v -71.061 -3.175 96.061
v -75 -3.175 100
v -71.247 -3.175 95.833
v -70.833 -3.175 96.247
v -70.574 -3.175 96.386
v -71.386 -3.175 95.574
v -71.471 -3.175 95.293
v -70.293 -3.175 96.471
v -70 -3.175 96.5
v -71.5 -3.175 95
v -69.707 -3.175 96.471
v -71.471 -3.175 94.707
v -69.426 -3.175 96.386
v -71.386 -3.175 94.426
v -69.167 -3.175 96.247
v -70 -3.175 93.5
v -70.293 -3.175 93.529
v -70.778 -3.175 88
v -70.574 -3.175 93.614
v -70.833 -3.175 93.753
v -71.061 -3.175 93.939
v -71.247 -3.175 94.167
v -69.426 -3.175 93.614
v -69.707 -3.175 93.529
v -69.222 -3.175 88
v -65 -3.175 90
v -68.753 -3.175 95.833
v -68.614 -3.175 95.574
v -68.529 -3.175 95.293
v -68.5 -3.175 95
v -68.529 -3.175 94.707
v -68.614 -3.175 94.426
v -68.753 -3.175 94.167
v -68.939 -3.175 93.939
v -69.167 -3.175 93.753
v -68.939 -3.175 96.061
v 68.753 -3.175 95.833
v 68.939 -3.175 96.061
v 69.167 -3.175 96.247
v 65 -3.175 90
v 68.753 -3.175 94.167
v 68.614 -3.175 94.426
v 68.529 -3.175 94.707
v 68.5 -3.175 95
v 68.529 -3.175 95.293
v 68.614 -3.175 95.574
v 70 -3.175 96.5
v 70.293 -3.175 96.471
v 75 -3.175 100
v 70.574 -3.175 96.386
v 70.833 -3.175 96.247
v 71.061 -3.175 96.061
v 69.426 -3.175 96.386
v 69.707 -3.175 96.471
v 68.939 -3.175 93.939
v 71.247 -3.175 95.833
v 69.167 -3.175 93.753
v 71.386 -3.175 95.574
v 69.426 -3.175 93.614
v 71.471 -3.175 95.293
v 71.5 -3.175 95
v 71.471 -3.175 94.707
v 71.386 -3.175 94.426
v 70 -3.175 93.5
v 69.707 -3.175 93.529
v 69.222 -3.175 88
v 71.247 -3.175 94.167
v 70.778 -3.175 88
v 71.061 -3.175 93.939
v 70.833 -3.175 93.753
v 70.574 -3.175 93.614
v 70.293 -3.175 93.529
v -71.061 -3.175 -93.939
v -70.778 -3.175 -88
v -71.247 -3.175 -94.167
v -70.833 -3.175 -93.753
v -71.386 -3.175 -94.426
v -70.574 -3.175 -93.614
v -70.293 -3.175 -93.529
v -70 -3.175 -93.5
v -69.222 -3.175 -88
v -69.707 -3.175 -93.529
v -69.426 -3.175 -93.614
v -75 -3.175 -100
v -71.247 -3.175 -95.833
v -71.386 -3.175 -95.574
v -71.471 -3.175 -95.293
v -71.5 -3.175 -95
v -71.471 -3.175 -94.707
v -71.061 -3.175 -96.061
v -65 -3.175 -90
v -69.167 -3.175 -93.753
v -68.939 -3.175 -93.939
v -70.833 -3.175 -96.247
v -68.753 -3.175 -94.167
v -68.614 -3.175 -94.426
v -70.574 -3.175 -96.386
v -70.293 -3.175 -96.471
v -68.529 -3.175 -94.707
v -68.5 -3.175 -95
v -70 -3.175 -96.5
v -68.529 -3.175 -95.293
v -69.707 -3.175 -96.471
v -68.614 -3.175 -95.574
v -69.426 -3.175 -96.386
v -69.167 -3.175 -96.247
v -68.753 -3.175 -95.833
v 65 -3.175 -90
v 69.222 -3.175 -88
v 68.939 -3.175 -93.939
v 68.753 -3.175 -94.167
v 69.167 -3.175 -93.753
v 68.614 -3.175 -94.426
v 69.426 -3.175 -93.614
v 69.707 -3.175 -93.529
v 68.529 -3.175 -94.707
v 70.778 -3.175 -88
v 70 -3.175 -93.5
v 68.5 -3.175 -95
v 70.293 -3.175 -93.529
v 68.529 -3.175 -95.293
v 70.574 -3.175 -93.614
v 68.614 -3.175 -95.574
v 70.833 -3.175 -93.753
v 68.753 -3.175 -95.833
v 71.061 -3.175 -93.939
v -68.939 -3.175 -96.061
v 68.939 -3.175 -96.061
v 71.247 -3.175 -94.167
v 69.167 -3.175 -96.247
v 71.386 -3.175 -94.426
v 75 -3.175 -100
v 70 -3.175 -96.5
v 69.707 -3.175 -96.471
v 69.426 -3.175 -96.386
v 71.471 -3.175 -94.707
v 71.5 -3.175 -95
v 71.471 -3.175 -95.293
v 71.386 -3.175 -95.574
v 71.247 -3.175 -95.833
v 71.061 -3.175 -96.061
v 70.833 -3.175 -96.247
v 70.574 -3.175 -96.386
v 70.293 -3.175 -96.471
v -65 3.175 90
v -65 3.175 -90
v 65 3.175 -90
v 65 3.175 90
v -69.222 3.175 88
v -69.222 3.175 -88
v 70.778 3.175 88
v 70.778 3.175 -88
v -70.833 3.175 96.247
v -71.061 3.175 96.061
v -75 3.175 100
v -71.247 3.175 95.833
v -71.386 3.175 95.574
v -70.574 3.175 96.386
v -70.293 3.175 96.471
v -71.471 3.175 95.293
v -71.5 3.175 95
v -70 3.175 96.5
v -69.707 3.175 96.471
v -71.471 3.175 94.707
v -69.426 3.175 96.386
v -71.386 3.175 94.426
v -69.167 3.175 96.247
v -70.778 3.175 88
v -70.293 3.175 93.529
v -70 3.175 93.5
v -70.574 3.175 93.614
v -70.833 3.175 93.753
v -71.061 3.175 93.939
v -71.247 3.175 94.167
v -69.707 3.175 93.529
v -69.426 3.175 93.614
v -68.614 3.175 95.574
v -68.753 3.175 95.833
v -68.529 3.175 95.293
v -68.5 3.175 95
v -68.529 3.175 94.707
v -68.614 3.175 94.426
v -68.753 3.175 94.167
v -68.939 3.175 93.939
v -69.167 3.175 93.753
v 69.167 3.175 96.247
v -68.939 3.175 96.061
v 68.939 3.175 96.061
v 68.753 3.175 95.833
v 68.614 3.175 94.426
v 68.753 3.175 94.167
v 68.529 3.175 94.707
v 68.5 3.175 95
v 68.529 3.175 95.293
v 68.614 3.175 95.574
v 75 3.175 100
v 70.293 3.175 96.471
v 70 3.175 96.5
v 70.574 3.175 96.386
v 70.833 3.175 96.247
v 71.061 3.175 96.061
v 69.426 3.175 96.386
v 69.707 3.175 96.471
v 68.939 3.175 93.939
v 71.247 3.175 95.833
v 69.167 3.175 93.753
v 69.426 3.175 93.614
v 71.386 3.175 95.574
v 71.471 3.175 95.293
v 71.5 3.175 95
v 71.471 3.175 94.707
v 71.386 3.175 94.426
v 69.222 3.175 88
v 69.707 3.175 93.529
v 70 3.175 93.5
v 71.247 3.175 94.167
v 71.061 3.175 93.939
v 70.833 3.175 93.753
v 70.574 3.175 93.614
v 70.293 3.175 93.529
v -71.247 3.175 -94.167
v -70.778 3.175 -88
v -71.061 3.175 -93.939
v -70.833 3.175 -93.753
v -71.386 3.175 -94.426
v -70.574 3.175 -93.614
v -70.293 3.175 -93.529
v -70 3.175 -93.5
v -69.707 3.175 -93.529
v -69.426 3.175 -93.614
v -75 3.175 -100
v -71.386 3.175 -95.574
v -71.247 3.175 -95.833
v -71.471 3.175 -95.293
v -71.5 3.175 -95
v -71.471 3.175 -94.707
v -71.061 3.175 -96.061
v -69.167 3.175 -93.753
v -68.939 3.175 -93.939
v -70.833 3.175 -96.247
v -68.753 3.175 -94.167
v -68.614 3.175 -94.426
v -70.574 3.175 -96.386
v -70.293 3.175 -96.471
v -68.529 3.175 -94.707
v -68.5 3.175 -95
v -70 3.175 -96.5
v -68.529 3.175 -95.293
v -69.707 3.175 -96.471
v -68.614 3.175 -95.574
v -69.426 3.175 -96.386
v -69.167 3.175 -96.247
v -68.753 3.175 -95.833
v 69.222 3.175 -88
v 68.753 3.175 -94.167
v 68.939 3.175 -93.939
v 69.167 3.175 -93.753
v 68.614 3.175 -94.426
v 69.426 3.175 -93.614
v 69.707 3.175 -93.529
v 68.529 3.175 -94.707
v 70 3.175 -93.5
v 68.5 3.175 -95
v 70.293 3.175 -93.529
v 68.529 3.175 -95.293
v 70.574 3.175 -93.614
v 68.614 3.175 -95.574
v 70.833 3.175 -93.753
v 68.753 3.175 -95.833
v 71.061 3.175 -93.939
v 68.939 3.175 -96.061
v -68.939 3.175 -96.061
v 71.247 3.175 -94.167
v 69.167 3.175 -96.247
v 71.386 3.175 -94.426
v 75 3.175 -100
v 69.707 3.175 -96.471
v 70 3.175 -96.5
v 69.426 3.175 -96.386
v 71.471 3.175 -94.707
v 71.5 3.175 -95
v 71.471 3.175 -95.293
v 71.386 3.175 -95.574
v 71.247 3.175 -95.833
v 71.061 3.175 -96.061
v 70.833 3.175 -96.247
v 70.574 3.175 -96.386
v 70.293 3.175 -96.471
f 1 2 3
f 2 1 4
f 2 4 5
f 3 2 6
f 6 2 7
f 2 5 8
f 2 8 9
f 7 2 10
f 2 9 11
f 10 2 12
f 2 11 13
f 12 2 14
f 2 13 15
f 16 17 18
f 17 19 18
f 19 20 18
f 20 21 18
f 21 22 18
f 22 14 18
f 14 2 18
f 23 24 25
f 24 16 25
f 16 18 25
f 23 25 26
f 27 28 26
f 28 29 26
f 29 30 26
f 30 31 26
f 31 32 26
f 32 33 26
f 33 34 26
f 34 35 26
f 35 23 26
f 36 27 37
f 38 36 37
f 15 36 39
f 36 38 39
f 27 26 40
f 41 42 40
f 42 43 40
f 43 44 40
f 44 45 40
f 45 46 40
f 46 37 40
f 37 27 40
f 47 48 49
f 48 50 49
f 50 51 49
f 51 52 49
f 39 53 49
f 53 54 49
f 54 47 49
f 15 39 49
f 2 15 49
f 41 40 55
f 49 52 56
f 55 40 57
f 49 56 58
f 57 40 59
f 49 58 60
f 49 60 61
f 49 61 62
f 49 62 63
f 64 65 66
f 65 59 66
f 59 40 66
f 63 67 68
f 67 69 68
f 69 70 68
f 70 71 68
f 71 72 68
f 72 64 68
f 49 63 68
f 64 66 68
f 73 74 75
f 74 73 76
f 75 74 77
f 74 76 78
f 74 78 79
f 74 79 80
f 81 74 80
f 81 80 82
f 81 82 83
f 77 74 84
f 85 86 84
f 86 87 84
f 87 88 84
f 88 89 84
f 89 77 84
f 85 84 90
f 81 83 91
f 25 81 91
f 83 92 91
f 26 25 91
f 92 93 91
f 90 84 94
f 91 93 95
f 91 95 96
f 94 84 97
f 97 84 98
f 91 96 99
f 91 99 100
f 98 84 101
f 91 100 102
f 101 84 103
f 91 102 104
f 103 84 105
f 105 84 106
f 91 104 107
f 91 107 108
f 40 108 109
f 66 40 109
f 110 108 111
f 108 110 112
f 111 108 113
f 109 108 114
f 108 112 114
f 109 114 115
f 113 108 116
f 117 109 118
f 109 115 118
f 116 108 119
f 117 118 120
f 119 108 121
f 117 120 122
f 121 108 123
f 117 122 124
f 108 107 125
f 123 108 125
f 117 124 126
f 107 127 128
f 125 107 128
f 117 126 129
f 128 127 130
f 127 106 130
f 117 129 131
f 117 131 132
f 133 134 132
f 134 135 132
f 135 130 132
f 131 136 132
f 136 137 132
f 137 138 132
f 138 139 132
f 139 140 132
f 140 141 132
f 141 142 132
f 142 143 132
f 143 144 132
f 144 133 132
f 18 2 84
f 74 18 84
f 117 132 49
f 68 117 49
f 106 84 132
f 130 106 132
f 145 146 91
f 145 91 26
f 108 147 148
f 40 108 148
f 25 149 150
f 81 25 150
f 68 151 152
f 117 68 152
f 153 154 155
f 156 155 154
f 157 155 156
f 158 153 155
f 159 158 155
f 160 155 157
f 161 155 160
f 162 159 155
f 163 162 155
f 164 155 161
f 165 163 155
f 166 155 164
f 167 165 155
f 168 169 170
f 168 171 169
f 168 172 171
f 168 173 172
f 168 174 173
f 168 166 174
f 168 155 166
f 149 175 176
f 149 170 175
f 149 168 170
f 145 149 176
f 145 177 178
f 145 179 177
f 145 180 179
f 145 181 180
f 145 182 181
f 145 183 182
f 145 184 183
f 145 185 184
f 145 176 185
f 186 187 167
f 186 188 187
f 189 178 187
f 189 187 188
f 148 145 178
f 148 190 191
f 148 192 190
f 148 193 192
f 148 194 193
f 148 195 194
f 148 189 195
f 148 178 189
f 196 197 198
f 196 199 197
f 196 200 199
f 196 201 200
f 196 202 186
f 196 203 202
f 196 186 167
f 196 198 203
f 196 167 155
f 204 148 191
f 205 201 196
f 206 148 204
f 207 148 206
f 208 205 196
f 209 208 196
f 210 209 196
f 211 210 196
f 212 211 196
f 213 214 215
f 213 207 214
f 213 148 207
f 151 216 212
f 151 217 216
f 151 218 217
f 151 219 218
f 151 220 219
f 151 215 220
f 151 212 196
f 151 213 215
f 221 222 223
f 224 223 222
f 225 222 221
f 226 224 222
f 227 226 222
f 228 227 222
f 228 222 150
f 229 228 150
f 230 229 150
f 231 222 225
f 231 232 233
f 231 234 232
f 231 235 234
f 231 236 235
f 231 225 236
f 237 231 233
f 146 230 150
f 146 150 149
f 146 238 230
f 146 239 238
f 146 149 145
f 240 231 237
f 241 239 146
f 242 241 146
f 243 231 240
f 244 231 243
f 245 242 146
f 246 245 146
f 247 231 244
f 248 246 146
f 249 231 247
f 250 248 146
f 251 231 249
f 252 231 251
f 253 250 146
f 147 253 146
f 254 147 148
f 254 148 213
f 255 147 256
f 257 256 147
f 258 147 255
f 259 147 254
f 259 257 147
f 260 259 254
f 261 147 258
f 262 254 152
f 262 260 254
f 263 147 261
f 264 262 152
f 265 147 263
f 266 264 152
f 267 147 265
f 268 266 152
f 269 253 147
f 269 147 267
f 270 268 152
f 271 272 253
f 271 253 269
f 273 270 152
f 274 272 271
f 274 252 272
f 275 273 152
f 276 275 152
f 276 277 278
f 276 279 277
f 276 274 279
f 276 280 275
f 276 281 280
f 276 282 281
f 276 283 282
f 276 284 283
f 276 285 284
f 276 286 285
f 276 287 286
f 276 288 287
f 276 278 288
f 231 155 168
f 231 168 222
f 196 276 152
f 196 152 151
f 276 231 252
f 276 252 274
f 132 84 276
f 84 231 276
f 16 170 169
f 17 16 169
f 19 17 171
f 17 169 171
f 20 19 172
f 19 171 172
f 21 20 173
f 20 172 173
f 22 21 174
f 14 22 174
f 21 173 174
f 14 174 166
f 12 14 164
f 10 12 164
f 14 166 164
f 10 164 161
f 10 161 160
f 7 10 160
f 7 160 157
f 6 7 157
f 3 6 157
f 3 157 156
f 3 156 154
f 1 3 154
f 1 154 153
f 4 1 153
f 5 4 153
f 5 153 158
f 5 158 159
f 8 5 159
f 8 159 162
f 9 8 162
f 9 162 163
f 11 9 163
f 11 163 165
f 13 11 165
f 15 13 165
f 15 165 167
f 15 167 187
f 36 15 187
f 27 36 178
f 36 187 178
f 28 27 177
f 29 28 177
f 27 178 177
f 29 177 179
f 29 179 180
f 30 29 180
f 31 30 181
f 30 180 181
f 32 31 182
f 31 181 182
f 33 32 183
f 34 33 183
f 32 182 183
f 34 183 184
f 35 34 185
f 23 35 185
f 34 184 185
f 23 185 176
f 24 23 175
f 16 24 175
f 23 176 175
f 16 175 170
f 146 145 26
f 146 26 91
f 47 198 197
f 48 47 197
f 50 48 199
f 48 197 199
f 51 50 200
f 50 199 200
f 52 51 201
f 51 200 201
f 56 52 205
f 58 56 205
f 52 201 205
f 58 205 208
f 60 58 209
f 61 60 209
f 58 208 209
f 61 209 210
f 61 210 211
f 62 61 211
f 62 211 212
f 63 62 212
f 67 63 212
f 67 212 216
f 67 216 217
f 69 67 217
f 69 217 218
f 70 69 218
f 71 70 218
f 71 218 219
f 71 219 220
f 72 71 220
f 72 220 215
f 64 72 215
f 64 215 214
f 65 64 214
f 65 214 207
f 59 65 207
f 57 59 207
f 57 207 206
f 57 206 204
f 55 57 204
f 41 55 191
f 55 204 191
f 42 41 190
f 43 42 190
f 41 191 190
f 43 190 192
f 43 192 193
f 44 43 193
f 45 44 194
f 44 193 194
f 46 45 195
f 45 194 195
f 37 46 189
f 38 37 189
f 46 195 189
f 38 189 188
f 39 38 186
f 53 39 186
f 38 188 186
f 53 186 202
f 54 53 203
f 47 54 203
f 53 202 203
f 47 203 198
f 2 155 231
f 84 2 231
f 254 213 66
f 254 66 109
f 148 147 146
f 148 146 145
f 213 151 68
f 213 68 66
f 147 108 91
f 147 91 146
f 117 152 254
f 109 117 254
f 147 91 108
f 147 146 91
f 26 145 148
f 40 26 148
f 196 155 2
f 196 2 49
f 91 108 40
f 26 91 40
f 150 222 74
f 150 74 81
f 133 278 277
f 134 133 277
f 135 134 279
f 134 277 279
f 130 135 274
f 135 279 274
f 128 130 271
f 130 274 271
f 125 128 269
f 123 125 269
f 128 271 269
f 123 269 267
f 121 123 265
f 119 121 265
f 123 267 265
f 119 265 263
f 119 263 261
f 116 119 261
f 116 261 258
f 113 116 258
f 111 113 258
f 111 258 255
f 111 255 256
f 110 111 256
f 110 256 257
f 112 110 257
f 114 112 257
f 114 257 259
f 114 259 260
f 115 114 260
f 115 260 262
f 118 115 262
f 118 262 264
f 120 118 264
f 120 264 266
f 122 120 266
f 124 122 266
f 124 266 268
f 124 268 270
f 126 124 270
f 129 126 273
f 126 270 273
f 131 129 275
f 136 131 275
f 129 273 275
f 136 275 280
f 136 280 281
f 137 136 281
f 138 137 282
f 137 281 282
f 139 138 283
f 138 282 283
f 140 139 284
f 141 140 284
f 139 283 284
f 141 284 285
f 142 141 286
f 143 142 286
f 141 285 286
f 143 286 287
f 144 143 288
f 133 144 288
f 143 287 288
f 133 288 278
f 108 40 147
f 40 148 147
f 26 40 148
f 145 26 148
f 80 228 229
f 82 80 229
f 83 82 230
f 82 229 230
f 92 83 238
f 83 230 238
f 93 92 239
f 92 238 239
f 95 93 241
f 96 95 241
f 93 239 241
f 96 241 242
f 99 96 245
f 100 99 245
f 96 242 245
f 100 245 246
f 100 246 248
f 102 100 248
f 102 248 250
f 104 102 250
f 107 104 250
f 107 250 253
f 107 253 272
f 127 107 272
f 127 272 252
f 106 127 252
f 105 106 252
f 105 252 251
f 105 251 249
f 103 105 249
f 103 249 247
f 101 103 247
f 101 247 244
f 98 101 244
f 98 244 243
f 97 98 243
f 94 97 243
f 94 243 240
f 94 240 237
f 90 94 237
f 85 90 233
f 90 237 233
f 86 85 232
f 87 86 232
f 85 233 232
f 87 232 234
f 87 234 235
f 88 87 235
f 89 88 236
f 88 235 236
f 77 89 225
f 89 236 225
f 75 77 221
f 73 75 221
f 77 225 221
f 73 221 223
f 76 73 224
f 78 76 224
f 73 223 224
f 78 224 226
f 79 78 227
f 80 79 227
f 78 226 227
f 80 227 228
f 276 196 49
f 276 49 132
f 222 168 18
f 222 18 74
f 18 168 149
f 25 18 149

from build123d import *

# Parameters (mm, degrees)
SKETCH1_W           = 150
SKETCH1_H           = 200
SKETCH1_W_2         = 130
SKETCH1_H_2         = 180
MAINBODY_DEPTH      = 3.175
SHEETLOCK_REACH     = 127.161
SKETCH2_W           = 1.55575
SKETCH2_H           = 176
SUPPORTHOLES_REACH  = 127.161
SKETCH3_R           = 1.5
SKETCH4_W           = 180
SKETCH4_H           = 6.35
BOSS_EXTRUDE1_DEPTH = 130


with BuildPart() as part:
    # Sketch1 → MainBody (new, symmetric)
    with BuildSketch(Plane(origin=(0, 0, 0), x_dir=(1, 0, 0), z_dir=(0, 1, 0))):
        Rectangle(SKETCH1_W, SKETCH1_H)
        Rectangle(SKETCH1_W_2, SKETCH1_H_2, mode=Mode.SUBTRACT)
    extrude(amount=MAINBODY_DEPTH, both=True)

    # Sketch2 → SheetLock (cut, up to next)
    with BuildSketch(Plane(origin=(0, 3.175, 0), x_dir=(1, 0, 0), z_dir=(0, 1, 0)), mode=Mode.PRIVATE) as sheetlock_sk1:
        with Locations((-70, 0)):
            Rectangle(SKETCH2_W, SKETCH2_H)
    sheetlock_tool1 = extrude(sheetlock_sk1.sketch, amount=-SHEETLOCK_REACH, mode=Mode.PRIVATE) & part.part
    sheetlock = sheetlock_tool1.solids().sort_by_distance((-70, 3.175, 0))[0]
    add(sheetlock, mode=Mode.SUBTRACT)

    # Mirror1: SheetLock across plane
    add(sheetlock.mirror(Plane(origin=(0, 0, 0), x_dir=(0, 0, 1), z_dir=(1, 0, 0))), mode=Mode.SUBTRACT)

    # Sketch3 → SupportHoles (cut, up to next)
    with BuildSketch(Plane(origin=(0, 3.175, 0), x_dir=(1, 0, 0), z_dir=(0, 1, 0)), mode=Mode.PRIVATE) as supportholes_sk1:
        with Locations(Location((-70, 95, 0), (0, 0, 270))):
            Circle(SKETCH3_R)
    supportholes_tool1 = extrude(supportholes_sk1.sketch, amount=-SUPPORTHOLES_REACH, mode=Mode.PRIVATE) & part.part
    # Sketch3 → SupportHoles (cut, up to next)
    with BuildSketch(Plane(origin=(0, 3.175, 0), x_dir=(1, 0, 0), z_dir=(0, 1, 0)), mode=Mode.PRIVATE) as supportholes_sk2:
        with Locations(Location((70, 95, 0), (0, 0, 90))):
            Circle(SKETCH3_R)
    supportholes_tool2 = extrude(supportholes_sk2.sketch, amount=-SUPPORTHOLES_REACH, mode=Mode.PRIVATE) & part.part
    # Sketch3 → SupportHoles (cut, up to next)
    with BuildSketch(Plane(origin=(0, 3.175, 0), x_dir=(1, 0, 0), z_dir=(0, 1, 0)), mode=Mode.PRIVATE) as supportholes_sk3:
        with Locations(Location((70, -95, 0), (0, 0, 270))):
            Circle(SKETCH3_R)
    supportholes_tool3 = extrude(supportholes_sk3.sketch, amount=-SUPPORTHOLES_REACH, mode=Mode.PRIVATE) & part.part
    # Sketch3 → SupportHoles (cut, up to next)
    with BuildSketch(Plane(origin=(0, 3.175, 0), x_dir=(1, 0, 0), z_dir=(0, 1, 0)), mode=Mode.PRIVATE) as supportholes_sk4:
        with Locations(Location((-70, -95, 0), (0, 0, 90))):
            Circle(SKETCH3_R)
    supportholes_tool4 = extrude(supportholes_sk4.sketch, amount=-SUPPORTHOLES_REACH, mode=Mode.PRIVATE) & part.part
    add(supportholes_tool1.solids().sort_by_distance((-70, 3.175, -95))[0], mode=Mode.SUBTRACT)
    add(supportholes_tool2.solids().sort_by_distance((70, 3.175, -95))[0], mode=Mode.SUBTRACT)
    add(supportholes_tool3.solids().sort_by_distance((70, 3.175, 95))[0], mode=Mode.SUBTRACT)
    add(supportholes_tool4.solids().sort_by_distance((-70, 3.175, 95))[0], mode=Mode.SUBTRACT)


with BuildPart() as body_2:
    # Sketch4 → Boss-Extrude1 (new body)
    with BuildSketch(Plane.ZY.offset(-65)):
        Rectangle(SKETCH4_W, SKETCH4_H)
    extrude(amount=BOSS_EXTRUDE1_DEPTH)


solid = Compound([part.part, body_2.part])
